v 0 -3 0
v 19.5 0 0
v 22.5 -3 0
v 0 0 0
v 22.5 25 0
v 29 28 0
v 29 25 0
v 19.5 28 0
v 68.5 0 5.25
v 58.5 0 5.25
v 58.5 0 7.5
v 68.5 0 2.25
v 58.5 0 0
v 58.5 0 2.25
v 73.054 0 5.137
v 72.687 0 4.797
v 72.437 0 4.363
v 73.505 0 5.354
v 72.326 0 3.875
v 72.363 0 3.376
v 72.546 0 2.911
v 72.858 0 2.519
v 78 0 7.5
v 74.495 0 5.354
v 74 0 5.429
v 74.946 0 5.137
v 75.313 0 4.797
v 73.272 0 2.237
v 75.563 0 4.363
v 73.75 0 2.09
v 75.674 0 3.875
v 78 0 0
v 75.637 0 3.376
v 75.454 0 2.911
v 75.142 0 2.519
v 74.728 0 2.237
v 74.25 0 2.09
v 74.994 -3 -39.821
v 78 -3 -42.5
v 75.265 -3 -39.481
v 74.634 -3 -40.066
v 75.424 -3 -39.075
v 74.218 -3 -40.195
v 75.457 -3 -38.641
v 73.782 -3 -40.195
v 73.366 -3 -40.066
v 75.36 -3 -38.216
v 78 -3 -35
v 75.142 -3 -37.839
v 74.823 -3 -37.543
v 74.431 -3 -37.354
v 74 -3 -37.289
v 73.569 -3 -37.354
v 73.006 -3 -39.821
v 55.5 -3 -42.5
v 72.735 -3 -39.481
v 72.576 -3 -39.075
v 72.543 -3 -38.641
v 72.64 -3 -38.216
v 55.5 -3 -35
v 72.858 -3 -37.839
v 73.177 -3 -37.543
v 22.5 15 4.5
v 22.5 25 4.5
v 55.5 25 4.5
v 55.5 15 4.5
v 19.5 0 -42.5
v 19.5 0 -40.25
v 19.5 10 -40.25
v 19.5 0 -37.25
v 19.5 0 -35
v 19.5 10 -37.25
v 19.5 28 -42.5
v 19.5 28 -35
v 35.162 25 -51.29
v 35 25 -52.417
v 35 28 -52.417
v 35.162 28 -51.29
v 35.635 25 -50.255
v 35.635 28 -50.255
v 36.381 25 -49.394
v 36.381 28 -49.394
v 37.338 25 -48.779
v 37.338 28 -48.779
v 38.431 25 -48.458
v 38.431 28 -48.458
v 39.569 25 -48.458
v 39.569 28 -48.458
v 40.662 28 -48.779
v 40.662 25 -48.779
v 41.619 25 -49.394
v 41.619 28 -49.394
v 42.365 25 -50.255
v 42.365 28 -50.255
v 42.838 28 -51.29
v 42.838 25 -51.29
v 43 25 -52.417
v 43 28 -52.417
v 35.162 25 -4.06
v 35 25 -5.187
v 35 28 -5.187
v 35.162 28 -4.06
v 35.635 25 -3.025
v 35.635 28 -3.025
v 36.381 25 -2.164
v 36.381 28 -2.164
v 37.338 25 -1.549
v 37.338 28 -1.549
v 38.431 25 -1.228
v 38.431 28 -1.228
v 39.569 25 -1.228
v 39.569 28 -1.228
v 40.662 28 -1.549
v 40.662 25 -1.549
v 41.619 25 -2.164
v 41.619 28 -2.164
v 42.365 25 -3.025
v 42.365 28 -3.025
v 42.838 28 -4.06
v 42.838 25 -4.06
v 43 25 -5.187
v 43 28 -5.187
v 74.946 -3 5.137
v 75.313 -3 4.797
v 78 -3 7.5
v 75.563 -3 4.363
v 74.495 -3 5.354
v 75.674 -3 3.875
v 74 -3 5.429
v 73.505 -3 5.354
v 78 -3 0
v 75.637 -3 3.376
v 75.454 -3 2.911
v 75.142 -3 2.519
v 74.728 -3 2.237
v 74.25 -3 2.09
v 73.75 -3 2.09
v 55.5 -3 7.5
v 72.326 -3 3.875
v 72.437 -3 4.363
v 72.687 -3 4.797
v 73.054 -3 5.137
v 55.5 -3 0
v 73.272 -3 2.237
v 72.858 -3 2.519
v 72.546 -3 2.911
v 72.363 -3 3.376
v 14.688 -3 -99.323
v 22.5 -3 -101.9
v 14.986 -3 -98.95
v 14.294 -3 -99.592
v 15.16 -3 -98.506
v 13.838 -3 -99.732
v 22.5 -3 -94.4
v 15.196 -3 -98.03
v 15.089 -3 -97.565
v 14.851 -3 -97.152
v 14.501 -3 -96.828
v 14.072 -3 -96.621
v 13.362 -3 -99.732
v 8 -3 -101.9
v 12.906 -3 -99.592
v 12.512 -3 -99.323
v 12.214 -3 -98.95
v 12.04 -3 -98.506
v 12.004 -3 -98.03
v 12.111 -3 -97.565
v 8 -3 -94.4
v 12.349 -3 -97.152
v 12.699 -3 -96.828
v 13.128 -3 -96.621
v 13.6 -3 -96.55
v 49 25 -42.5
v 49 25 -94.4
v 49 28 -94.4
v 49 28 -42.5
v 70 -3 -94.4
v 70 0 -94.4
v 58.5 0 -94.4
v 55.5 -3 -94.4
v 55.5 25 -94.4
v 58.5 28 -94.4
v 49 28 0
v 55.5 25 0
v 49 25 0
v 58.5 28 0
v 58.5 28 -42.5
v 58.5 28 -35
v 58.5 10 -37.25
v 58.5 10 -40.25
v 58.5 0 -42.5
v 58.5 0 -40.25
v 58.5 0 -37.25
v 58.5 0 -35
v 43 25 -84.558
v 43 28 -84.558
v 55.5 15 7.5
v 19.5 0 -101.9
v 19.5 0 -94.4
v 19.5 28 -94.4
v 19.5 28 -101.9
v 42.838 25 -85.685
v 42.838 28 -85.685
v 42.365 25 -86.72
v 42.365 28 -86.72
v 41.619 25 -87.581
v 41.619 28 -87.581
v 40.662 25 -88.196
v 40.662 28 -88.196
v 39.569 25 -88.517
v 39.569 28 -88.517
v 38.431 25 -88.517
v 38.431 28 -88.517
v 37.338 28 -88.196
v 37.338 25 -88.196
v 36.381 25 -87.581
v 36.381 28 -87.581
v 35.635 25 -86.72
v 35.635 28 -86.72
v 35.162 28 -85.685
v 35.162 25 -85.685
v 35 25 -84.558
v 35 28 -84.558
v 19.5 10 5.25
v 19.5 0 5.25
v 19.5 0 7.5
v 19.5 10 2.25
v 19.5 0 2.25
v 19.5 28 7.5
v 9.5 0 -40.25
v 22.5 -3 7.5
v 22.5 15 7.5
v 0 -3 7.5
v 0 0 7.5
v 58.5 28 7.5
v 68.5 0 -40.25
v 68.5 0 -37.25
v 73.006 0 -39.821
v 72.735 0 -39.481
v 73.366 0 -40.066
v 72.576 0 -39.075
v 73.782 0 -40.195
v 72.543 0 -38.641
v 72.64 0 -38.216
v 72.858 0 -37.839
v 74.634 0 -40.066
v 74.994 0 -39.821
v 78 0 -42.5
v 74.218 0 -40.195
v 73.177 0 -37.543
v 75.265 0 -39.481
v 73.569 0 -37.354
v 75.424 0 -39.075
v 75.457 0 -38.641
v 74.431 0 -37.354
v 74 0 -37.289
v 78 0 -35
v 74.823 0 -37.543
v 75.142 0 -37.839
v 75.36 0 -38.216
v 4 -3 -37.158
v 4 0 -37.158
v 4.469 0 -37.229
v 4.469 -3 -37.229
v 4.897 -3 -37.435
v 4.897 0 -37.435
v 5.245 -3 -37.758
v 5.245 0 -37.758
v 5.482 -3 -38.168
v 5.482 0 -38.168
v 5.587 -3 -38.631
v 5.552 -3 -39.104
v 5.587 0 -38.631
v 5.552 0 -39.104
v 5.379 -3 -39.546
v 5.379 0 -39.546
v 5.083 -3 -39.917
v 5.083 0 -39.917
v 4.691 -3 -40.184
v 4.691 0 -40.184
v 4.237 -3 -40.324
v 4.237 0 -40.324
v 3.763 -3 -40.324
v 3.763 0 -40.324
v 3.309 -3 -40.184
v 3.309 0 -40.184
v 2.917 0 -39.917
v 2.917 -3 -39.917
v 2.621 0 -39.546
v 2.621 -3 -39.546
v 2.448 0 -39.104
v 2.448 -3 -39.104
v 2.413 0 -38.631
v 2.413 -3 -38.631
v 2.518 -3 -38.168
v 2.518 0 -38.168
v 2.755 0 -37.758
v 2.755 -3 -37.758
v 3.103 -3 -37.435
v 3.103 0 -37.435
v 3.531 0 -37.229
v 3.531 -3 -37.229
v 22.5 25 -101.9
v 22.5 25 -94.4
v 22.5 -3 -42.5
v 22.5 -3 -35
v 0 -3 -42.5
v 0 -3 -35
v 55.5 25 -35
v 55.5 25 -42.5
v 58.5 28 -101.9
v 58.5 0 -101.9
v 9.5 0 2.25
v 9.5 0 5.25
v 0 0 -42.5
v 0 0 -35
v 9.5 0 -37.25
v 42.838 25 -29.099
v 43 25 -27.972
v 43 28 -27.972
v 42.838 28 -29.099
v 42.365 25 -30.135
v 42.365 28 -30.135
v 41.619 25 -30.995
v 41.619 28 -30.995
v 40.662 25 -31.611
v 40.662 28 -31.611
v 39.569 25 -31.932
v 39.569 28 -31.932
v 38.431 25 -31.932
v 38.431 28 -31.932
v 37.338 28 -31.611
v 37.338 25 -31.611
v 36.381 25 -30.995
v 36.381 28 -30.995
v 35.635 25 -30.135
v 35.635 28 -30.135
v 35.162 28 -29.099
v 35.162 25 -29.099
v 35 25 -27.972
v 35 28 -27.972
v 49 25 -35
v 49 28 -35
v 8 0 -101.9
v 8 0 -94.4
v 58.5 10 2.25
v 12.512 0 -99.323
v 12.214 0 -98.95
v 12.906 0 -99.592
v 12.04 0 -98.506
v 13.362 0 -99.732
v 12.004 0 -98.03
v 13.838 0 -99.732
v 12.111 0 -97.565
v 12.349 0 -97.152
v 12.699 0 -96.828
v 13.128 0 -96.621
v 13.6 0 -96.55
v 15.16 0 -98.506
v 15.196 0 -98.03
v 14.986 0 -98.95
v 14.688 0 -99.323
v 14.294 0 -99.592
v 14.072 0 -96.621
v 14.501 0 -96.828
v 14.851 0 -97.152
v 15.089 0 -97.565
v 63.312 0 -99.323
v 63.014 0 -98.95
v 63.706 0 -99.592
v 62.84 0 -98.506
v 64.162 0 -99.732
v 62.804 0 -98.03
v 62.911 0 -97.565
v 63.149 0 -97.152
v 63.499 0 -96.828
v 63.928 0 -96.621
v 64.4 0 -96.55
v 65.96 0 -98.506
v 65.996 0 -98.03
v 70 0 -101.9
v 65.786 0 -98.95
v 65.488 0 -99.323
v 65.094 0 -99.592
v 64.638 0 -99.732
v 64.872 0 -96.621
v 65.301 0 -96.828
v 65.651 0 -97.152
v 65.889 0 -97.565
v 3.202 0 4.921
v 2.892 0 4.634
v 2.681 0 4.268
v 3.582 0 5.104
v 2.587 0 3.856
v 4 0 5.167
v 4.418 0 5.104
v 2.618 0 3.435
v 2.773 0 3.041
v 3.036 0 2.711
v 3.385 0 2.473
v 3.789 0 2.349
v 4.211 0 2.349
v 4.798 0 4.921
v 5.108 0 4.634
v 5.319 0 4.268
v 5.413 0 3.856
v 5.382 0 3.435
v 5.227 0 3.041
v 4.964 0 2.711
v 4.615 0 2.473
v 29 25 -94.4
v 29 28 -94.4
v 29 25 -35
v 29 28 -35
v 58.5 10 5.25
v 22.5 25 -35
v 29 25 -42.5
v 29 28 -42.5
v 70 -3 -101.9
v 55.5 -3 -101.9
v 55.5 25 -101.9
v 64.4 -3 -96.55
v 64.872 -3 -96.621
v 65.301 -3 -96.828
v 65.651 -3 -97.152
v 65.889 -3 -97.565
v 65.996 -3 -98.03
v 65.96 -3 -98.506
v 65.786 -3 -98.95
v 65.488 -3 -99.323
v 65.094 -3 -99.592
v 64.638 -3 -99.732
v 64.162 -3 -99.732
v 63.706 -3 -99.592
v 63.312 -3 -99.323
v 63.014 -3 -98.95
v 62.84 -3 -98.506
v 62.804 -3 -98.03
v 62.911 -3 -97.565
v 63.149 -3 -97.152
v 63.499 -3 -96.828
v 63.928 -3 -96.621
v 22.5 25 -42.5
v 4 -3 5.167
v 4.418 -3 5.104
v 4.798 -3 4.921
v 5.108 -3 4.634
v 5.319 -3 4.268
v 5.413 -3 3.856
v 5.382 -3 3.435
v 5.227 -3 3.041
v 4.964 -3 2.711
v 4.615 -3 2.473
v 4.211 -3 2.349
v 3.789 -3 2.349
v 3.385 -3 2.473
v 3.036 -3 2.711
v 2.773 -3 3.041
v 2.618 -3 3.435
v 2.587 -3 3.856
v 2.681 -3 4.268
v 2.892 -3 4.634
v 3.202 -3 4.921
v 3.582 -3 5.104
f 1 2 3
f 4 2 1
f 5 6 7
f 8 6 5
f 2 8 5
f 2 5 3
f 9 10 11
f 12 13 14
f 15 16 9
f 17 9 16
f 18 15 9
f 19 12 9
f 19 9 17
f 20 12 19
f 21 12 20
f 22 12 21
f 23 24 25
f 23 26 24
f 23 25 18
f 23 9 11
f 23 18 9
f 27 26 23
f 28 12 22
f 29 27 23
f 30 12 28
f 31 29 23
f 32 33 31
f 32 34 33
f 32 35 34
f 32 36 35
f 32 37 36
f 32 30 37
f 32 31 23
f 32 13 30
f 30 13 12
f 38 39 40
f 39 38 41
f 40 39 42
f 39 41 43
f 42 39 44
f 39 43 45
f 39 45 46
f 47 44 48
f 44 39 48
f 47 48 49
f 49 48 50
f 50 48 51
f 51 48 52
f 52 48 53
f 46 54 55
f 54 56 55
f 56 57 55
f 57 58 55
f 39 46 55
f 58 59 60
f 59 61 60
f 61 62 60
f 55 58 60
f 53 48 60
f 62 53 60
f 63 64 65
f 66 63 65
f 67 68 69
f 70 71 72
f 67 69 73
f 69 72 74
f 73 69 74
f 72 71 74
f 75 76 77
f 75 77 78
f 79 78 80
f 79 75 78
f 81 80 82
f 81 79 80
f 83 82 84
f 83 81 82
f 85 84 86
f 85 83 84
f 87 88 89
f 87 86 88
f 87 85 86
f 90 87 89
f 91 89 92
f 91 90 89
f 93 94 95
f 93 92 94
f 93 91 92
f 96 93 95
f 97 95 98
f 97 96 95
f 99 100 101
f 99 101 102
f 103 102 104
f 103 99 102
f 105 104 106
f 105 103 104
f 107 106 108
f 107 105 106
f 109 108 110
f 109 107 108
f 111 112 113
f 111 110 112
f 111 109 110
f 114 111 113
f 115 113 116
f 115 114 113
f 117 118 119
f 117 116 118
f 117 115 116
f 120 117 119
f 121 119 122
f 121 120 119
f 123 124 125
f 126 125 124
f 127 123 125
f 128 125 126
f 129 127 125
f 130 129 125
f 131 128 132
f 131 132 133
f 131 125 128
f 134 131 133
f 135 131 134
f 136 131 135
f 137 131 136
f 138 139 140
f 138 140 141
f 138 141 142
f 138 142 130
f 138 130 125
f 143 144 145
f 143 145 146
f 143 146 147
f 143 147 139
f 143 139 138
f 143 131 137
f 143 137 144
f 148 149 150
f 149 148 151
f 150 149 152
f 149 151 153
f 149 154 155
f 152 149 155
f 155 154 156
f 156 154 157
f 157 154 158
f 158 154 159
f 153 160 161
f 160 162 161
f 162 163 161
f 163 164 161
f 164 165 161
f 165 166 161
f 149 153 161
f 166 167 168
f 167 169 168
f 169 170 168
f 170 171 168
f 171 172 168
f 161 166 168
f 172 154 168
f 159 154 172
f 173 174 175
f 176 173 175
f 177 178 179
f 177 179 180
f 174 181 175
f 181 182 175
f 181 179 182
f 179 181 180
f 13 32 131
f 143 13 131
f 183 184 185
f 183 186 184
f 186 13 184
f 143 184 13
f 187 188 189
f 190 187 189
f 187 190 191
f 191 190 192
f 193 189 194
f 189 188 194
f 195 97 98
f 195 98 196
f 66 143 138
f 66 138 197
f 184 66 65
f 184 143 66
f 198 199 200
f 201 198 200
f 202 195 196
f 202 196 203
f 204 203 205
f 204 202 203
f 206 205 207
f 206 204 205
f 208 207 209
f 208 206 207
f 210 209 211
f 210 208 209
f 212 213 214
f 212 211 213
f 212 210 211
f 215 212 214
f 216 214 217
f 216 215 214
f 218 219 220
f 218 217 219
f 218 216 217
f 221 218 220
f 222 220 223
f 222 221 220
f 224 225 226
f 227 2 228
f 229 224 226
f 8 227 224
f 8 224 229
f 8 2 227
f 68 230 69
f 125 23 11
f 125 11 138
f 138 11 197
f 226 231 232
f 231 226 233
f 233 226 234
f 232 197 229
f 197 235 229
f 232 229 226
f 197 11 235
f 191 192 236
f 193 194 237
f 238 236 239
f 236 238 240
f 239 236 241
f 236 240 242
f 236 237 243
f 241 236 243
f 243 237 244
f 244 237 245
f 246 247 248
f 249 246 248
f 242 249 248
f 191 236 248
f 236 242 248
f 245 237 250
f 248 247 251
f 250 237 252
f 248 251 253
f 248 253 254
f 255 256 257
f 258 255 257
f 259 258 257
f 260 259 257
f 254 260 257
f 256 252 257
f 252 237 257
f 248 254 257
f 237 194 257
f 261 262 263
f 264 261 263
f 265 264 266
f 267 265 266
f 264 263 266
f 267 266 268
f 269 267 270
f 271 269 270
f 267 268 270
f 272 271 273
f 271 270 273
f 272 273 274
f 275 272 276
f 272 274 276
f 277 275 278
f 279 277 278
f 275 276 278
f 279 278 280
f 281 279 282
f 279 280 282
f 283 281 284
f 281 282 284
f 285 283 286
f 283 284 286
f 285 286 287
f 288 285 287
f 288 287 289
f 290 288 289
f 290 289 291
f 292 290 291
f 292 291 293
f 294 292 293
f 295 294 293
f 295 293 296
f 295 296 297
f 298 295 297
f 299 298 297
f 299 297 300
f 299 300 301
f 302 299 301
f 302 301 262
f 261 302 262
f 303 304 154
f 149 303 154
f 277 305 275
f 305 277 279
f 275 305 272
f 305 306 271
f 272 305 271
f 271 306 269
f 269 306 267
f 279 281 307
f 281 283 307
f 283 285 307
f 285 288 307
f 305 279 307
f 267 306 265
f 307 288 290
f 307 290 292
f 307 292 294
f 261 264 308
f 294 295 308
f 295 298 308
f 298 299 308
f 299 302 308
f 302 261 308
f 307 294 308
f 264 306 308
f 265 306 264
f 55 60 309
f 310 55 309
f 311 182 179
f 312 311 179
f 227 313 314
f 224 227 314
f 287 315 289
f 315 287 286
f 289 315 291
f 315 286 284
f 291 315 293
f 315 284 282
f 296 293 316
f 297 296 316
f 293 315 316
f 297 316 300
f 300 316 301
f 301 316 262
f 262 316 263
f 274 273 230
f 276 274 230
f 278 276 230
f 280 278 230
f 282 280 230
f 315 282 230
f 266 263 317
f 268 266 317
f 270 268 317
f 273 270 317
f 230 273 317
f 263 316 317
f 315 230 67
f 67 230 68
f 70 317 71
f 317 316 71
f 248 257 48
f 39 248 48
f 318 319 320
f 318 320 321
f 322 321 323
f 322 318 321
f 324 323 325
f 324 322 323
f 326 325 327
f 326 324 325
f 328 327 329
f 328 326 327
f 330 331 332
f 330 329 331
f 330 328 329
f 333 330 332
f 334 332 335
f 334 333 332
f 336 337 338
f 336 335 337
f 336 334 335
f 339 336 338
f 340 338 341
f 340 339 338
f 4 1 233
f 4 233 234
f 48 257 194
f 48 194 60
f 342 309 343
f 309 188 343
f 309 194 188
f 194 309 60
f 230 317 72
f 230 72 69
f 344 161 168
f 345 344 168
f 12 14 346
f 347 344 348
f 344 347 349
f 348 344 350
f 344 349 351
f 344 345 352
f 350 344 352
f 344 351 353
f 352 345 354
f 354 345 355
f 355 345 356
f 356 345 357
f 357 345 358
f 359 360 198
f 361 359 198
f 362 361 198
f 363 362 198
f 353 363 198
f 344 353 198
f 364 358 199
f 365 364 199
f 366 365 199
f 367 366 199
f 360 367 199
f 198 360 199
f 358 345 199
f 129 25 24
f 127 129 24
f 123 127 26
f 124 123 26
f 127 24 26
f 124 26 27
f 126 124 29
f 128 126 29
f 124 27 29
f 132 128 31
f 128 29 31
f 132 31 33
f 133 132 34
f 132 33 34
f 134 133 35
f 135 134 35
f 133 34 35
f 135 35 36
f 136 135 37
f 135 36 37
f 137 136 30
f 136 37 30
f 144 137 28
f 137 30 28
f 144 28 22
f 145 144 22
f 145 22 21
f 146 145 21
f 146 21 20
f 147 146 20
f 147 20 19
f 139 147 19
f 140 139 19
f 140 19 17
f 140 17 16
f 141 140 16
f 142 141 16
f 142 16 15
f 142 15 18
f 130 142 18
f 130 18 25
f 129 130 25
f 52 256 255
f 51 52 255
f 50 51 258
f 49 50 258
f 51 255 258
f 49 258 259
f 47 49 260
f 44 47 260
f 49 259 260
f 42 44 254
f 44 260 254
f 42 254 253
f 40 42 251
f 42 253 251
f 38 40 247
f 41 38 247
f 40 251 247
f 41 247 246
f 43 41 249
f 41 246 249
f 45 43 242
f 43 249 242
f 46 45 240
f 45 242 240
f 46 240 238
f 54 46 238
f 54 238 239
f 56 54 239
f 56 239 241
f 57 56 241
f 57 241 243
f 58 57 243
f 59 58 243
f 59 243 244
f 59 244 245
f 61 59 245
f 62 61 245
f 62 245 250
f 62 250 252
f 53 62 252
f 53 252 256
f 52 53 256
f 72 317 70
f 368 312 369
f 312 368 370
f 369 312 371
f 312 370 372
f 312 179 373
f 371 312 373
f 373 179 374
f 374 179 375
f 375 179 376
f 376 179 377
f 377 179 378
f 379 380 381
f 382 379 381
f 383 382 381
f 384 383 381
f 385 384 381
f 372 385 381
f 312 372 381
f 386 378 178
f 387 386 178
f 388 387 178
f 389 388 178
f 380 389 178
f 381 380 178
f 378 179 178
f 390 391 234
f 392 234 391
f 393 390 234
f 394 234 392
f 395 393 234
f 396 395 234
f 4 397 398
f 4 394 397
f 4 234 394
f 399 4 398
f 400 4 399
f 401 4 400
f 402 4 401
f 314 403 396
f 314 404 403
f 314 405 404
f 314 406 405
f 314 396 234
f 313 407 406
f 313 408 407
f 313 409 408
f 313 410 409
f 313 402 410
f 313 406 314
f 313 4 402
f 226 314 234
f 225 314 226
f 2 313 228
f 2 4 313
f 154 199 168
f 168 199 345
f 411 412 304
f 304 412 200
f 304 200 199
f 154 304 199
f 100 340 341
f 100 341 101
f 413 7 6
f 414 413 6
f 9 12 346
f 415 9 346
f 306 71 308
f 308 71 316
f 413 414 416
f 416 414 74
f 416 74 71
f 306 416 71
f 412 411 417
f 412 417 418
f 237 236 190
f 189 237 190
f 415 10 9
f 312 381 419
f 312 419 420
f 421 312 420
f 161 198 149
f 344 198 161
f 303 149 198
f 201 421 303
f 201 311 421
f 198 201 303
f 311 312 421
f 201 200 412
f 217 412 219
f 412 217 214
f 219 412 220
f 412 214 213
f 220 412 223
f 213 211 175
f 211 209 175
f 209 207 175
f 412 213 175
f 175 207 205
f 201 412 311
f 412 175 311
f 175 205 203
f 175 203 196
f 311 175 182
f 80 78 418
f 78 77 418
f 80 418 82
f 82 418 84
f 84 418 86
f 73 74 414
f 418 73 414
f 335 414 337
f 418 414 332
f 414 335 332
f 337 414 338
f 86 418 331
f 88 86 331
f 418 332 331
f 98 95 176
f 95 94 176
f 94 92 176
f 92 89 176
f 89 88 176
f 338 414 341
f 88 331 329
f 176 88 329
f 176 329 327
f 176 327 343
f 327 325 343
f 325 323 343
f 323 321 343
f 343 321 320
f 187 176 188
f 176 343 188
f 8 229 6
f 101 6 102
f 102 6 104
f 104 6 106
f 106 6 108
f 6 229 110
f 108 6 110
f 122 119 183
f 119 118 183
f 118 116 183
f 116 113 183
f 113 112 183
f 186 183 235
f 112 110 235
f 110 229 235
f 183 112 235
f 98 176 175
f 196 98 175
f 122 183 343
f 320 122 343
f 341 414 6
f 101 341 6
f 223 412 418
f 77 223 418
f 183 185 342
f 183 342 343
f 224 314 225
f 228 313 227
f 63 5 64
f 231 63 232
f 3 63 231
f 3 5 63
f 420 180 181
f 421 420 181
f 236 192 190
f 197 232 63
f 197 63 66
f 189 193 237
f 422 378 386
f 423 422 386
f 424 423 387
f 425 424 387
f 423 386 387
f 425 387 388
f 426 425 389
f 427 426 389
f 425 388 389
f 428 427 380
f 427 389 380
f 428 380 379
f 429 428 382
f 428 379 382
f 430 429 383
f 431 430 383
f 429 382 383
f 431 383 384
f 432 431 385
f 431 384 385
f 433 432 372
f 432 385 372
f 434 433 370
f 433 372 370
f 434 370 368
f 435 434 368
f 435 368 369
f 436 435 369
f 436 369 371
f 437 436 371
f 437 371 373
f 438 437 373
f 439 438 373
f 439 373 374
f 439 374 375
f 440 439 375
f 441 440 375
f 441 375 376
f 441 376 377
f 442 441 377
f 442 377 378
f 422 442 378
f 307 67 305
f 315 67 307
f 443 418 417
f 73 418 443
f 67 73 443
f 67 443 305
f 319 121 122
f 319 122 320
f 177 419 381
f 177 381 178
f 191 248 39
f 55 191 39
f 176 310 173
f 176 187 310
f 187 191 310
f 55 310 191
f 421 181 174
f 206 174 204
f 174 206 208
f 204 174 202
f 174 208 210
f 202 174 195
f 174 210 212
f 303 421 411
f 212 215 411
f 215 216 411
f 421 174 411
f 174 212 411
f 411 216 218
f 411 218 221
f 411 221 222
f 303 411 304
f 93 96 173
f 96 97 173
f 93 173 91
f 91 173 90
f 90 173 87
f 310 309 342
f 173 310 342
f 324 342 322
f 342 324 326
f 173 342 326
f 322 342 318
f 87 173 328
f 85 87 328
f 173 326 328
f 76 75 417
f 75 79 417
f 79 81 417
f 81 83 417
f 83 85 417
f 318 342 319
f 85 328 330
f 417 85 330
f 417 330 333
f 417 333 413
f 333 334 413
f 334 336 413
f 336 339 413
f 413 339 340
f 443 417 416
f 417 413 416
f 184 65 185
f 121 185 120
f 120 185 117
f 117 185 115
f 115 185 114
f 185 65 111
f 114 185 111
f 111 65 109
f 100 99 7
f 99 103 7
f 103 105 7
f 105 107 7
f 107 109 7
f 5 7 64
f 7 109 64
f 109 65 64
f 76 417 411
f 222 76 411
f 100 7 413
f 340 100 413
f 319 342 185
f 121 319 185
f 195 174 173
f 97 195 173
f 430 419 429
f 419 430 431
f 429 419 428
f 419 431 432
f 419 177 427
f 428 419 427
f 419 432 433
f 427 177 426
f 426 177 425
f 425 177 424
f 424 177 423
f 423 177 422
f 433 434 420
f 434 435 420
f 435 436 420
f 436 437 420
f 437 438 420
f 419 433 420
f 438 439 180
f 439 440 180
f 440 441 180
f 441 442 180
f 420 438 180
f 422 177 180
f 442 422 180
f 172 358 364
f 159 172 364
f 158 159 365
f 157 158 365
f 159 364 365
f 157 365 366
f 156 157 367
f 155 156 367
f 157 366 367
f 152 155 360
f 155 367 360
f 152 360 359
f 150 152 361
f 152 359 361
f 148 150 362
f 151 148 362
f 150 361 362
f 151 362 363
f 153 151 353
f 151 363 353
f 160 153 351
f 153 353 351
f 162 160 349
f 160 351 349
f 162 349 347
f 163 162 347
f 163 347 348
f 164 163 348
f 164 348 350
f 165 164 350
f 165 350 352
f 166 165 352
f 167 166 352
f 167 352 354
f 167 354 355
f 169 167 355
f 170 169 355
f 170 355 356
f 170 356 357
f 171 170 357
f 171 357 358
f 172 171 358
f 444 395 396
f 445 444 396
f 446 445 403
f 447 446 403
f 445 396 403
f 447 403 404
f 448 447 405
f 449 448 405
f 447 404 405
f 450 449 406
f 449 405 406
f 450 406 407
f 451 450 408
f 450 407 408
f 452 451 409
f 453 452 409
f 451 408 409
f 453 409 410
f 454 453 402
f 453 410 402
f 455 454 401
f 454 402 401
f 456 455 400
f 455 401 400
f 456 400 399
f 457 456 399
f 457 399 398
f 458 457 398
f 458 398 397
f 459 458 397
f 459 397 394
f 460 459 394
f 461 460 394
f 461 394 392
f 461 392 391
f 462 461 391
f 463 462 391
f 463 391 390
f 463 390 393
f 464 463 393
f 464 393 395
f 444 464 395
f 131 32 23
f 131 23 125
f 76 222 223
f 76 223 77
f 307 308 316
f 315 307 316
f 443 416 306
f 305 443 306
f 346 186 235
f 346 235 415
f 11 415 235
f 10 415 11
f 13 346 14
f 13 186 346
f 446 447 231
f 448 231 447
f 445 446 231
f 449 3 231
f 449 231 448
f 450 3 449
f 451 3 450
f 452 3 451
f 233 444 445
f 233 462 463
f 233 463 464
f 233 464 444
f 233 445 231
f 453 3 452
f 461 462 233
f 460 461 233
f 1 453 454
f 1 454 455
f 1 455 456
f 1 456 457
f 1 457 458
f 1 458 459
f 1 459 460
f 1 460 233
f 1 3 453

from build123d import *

# Parameters (mm, degrees)
BOSS_EXTRUDE1_DEPTH      = 7.5
SKETCH4_W                = 20
SKETCH4_H                = 3
BOSS_EXTRUDE2_DEPTH      = 35
SKETCH6_W                = 20
SKETCH6_H                = 3
BOSS_EXTRUDE3_DEPTH      = 59.4
SKETCH5_R                = 1.678965669
SKETCH5_R_2              = 1.417070449
SKETCH5_R_3              = 1.591812116
SKETCH5_R_4              = 1.461089302
CUT_EXTRUDE1_DEPTH       = 132.345384388
SKETCH7_R                = 1.6
CUT_EXTRUDE2_DEPTH       = 132.345384388
SKETCH10_W               = 33
SKETCH10_H               = 3
BOSS_EXTRUDE4_DEPTH      = 10
SKETCH11_W               = 8
SKETCH11_H               = 7.5
CUT_EXTRUDE4_DEPTH       = 133.017460966
SKETCH12_W               = 10
SKETCH12_H               = 3
BOSS_EXTRUDE5_DEPTH      = 10
CHAMFER1_SIZE            = 10
CHAMFER1_OF_MIRROR6_SIZE = 10
MIRROR7_START            = -40.25
MIRROR7_DEPTH            = 3
MIRROR7_START_2          = 2.25
MIRROR7_2_DEPTH          = 3
CUT_EXTRUDE5_DEPTH       = 132.345384388


# Read off the part's stored shape, not the designer's step: Mirror7
with BuildPart() as part:
    # Sketch3 → Boss-Extrude1 (new body)
    with BuildSketch(Plane.XY):
        Polygon((0, 0), (19.5, 0), (19.5, 28), (58.5, 28), (58.5, 0), (78, 0), (78, -3), (55.5, -3), (55.5, 25), (22.5, 25), (22.5, -3), (0, -3), align=None)
    boss_extrude1 = extrude(amount=BOSS_EXTRUDE1_DEPTH)

    # Sketch4 → Boss-Extrude2 (add)
    with BuildSketch(Plane(origin=(0, 0, 0), x_dir=(-1, 0, 0), z_dir=(0, 0, -1))):
        with Locations((-39, 26.5)):
            Rectangle(SKETCH4_W, SKETCH4_H)
    extrude(amount=BOSS_EXTRUDE2_DEPTH)

    # Mirror1: Boss-Extrude1 across plane
    add(boss_extrude1.mirror(Plane(origin=(0, 0, -17.5), x_dir=(1, 0, 0), z_dir=(0, 0, -1))))

    # Sketch6 → Boss-Extrude3 (add)
    with BuildSketch(Plane(origin=(0, 0, -42.5), x_dir=(-1, 0, 0), z_dir=(0, 0, -1))):
        with Locations((-39, 26.5)):
            Rectangle(SKETCH6_W, SKETCH6_H)
    extrude(amount=BOSS_EXTRUDE3_DEPTH)

    # Sketch5 → Cut-Extrude1 (cut, through all)
    with BuildSketch(Plane(origin=(0, 0, 0), x_dir=(1, 0, 0), z_dir=(0, 1, 0))):
        with Locations(Location((74, -3.75, 0), (0, 0, 270))):
            Circle(SKETCH5_R)
        with Locations(Location((4, -3.75, 0), (0, 0, 270))):
            Circle(SKETCH5_R_2)
        with Locations(Location((4, 38.75, 0), (0, 0, 270))):
            Circle(SKETCH5_R_3)
        with Locations(Location((74, 38.75, 0), (0, 0, 270))):
            Circle(SKETCH5_R_4)
    extrude(amount=-CUT_EXTRUDE1_DEPTH, mode=Mode.SUBTRACT)

    # Mirror5: Boss-Extrude1 across plane
    add(boss_extrude1.mirror(Plane(origin=(0, 0, -47.2), x_dir=(1, 0, 0), z_dir=(0, 0, -1))))

    # Sketch7 → Cut-Extrude2 (cut, through all)
    with BuildSketch(Plane(origin=(0, 0, 0), x_dir=(1, 0, 0), z_dir=(0, 1, 0))):
        with Locations(Location((64.4, 98.15, 0), (0, 0, 270))):
            Circle(SKETCH7_R)
        with Locations(Location((13.6, 98.15, 0), (0, 0, 270))):
            Circle(SKETCH7_R)
    extrude(amount=-CUT_EXTRUDE2_DEPTH, mode=Mode.SUBTRACT)

    # Sketch10 → Boss-Extrude4 (add)
    with BuildSketch(Plane.XZ.offset(-25)):
        with Locations((39, 6)):
            Rectangle(SKETCH10_W, SKETCH10_H)
    extrude(amount=BOSS_EXTRUDE4_DEPTH)

    # Sketch11 → Cut-Extrude4 (cut, through all)
    with BuildSketch(Plane.XZ.offset(3)):
        with Locations((4, -98.15)):
            Rectangle(SKETCH11_W, SKETCH11_H)
        with Locations((74, -98.15)):
            Rectangle(SKETCH11_W, SKETCH11_H)
    extrude(amount=-CUT_EXTRUDE4_DEPTH, mode=Mode.SUBTRACT)

    # Sketch12 → Boss-Extrude5 (add)
    with BuildSketch(Plane(origin=(0, 0, 0), x_dir=(1, 0, 0), z_dir=(0, 1, 0))):
        with Locations((14.5, 38.75)):
            Rectangle(SKETCH12_W, SKETCH12_H)
    boss_extrude5 = extrude(amount=BOSS_EXTRUDE5_DEPTH)

    # Chamfer1
    chamfer1_edges = [part.edges().sort_by_distance(p)[0] for p in [
        (9.5, 10, -38.75),
    ]]
    chamfer(chamfer1_edges, length=CHAMFER1_SIZE - 0.0001)  # a hair under: the kernel refuses the full size

    # Mirror6: Boss-Extrude5 across plane
    add(boss_extrude5.mirror(Plane.XY.offset(-17.5)))

    # Chamfer1 of Mirror6
    chamfer1_of_mirror6_edges = [part.edges().sort_by_distance(p)[0] for p in [
        (9.5, 10, 3.75),
    ]]
    chamfer(chamfer1_of_mirror6_edges, length=CHAMFER1_OF_MIRROR6_SIZE - 0.0001)  # a hair under: the kernel refuses the full size

    # Mirror7 outline → Mirror7 (add)
    with BuildSketch(Plane.XY.offset(MIRROR7_START)):
        Polygon((58.5, 0), (68.5, 0), (58.5, 10), align=None)
    extrude(amount=MIRROR7_DEPTH)

    # Mirror7 2 outline → Mirror7 2 (add)
    with BuildSketch(Plane.XY.offset(MIRROR7_START_2)):
        Polygon((58.5, 0), (68.5, 0), (58.5, 10), align=None)
    extrude(amount=MIRROR7_2_DEPTH)

    # Sketch13 → Cut-Extrude5 (cut, through all)
    with BuildSketch(Plane.XZ.offset(-25)):
        with BuildLine():
            Line((43, -5.187147638), (43, -27.972265557))
            ThreePointArc((43, -27.972265557), (39, -31.972265557), (35, -27.972265557))
            Line((35, -27.972265557), (35, -5.187147638))
            ThreePointArc((35, -5.187147638), (39, -1.187147638), (43, -5.187147638))
        make_face()
        with BuildLine():
            Line((43, -52.417226503), (43, -84.557823303))
            ThreePointArc((43, -84.557823303), (39, -88.557823303), (35, -84.557823303))
            Line((35, -84.557823303), (35, -52.417226503))
            ThreePointArc((35, -52.417226503), (39, -48.417226503), (43, -52.417226503))
        make_face()
    extrude(amount=-CUT_EXTRUDE5_DEPTH, mode=Mode.SUBTRACT)


solid = part.part
